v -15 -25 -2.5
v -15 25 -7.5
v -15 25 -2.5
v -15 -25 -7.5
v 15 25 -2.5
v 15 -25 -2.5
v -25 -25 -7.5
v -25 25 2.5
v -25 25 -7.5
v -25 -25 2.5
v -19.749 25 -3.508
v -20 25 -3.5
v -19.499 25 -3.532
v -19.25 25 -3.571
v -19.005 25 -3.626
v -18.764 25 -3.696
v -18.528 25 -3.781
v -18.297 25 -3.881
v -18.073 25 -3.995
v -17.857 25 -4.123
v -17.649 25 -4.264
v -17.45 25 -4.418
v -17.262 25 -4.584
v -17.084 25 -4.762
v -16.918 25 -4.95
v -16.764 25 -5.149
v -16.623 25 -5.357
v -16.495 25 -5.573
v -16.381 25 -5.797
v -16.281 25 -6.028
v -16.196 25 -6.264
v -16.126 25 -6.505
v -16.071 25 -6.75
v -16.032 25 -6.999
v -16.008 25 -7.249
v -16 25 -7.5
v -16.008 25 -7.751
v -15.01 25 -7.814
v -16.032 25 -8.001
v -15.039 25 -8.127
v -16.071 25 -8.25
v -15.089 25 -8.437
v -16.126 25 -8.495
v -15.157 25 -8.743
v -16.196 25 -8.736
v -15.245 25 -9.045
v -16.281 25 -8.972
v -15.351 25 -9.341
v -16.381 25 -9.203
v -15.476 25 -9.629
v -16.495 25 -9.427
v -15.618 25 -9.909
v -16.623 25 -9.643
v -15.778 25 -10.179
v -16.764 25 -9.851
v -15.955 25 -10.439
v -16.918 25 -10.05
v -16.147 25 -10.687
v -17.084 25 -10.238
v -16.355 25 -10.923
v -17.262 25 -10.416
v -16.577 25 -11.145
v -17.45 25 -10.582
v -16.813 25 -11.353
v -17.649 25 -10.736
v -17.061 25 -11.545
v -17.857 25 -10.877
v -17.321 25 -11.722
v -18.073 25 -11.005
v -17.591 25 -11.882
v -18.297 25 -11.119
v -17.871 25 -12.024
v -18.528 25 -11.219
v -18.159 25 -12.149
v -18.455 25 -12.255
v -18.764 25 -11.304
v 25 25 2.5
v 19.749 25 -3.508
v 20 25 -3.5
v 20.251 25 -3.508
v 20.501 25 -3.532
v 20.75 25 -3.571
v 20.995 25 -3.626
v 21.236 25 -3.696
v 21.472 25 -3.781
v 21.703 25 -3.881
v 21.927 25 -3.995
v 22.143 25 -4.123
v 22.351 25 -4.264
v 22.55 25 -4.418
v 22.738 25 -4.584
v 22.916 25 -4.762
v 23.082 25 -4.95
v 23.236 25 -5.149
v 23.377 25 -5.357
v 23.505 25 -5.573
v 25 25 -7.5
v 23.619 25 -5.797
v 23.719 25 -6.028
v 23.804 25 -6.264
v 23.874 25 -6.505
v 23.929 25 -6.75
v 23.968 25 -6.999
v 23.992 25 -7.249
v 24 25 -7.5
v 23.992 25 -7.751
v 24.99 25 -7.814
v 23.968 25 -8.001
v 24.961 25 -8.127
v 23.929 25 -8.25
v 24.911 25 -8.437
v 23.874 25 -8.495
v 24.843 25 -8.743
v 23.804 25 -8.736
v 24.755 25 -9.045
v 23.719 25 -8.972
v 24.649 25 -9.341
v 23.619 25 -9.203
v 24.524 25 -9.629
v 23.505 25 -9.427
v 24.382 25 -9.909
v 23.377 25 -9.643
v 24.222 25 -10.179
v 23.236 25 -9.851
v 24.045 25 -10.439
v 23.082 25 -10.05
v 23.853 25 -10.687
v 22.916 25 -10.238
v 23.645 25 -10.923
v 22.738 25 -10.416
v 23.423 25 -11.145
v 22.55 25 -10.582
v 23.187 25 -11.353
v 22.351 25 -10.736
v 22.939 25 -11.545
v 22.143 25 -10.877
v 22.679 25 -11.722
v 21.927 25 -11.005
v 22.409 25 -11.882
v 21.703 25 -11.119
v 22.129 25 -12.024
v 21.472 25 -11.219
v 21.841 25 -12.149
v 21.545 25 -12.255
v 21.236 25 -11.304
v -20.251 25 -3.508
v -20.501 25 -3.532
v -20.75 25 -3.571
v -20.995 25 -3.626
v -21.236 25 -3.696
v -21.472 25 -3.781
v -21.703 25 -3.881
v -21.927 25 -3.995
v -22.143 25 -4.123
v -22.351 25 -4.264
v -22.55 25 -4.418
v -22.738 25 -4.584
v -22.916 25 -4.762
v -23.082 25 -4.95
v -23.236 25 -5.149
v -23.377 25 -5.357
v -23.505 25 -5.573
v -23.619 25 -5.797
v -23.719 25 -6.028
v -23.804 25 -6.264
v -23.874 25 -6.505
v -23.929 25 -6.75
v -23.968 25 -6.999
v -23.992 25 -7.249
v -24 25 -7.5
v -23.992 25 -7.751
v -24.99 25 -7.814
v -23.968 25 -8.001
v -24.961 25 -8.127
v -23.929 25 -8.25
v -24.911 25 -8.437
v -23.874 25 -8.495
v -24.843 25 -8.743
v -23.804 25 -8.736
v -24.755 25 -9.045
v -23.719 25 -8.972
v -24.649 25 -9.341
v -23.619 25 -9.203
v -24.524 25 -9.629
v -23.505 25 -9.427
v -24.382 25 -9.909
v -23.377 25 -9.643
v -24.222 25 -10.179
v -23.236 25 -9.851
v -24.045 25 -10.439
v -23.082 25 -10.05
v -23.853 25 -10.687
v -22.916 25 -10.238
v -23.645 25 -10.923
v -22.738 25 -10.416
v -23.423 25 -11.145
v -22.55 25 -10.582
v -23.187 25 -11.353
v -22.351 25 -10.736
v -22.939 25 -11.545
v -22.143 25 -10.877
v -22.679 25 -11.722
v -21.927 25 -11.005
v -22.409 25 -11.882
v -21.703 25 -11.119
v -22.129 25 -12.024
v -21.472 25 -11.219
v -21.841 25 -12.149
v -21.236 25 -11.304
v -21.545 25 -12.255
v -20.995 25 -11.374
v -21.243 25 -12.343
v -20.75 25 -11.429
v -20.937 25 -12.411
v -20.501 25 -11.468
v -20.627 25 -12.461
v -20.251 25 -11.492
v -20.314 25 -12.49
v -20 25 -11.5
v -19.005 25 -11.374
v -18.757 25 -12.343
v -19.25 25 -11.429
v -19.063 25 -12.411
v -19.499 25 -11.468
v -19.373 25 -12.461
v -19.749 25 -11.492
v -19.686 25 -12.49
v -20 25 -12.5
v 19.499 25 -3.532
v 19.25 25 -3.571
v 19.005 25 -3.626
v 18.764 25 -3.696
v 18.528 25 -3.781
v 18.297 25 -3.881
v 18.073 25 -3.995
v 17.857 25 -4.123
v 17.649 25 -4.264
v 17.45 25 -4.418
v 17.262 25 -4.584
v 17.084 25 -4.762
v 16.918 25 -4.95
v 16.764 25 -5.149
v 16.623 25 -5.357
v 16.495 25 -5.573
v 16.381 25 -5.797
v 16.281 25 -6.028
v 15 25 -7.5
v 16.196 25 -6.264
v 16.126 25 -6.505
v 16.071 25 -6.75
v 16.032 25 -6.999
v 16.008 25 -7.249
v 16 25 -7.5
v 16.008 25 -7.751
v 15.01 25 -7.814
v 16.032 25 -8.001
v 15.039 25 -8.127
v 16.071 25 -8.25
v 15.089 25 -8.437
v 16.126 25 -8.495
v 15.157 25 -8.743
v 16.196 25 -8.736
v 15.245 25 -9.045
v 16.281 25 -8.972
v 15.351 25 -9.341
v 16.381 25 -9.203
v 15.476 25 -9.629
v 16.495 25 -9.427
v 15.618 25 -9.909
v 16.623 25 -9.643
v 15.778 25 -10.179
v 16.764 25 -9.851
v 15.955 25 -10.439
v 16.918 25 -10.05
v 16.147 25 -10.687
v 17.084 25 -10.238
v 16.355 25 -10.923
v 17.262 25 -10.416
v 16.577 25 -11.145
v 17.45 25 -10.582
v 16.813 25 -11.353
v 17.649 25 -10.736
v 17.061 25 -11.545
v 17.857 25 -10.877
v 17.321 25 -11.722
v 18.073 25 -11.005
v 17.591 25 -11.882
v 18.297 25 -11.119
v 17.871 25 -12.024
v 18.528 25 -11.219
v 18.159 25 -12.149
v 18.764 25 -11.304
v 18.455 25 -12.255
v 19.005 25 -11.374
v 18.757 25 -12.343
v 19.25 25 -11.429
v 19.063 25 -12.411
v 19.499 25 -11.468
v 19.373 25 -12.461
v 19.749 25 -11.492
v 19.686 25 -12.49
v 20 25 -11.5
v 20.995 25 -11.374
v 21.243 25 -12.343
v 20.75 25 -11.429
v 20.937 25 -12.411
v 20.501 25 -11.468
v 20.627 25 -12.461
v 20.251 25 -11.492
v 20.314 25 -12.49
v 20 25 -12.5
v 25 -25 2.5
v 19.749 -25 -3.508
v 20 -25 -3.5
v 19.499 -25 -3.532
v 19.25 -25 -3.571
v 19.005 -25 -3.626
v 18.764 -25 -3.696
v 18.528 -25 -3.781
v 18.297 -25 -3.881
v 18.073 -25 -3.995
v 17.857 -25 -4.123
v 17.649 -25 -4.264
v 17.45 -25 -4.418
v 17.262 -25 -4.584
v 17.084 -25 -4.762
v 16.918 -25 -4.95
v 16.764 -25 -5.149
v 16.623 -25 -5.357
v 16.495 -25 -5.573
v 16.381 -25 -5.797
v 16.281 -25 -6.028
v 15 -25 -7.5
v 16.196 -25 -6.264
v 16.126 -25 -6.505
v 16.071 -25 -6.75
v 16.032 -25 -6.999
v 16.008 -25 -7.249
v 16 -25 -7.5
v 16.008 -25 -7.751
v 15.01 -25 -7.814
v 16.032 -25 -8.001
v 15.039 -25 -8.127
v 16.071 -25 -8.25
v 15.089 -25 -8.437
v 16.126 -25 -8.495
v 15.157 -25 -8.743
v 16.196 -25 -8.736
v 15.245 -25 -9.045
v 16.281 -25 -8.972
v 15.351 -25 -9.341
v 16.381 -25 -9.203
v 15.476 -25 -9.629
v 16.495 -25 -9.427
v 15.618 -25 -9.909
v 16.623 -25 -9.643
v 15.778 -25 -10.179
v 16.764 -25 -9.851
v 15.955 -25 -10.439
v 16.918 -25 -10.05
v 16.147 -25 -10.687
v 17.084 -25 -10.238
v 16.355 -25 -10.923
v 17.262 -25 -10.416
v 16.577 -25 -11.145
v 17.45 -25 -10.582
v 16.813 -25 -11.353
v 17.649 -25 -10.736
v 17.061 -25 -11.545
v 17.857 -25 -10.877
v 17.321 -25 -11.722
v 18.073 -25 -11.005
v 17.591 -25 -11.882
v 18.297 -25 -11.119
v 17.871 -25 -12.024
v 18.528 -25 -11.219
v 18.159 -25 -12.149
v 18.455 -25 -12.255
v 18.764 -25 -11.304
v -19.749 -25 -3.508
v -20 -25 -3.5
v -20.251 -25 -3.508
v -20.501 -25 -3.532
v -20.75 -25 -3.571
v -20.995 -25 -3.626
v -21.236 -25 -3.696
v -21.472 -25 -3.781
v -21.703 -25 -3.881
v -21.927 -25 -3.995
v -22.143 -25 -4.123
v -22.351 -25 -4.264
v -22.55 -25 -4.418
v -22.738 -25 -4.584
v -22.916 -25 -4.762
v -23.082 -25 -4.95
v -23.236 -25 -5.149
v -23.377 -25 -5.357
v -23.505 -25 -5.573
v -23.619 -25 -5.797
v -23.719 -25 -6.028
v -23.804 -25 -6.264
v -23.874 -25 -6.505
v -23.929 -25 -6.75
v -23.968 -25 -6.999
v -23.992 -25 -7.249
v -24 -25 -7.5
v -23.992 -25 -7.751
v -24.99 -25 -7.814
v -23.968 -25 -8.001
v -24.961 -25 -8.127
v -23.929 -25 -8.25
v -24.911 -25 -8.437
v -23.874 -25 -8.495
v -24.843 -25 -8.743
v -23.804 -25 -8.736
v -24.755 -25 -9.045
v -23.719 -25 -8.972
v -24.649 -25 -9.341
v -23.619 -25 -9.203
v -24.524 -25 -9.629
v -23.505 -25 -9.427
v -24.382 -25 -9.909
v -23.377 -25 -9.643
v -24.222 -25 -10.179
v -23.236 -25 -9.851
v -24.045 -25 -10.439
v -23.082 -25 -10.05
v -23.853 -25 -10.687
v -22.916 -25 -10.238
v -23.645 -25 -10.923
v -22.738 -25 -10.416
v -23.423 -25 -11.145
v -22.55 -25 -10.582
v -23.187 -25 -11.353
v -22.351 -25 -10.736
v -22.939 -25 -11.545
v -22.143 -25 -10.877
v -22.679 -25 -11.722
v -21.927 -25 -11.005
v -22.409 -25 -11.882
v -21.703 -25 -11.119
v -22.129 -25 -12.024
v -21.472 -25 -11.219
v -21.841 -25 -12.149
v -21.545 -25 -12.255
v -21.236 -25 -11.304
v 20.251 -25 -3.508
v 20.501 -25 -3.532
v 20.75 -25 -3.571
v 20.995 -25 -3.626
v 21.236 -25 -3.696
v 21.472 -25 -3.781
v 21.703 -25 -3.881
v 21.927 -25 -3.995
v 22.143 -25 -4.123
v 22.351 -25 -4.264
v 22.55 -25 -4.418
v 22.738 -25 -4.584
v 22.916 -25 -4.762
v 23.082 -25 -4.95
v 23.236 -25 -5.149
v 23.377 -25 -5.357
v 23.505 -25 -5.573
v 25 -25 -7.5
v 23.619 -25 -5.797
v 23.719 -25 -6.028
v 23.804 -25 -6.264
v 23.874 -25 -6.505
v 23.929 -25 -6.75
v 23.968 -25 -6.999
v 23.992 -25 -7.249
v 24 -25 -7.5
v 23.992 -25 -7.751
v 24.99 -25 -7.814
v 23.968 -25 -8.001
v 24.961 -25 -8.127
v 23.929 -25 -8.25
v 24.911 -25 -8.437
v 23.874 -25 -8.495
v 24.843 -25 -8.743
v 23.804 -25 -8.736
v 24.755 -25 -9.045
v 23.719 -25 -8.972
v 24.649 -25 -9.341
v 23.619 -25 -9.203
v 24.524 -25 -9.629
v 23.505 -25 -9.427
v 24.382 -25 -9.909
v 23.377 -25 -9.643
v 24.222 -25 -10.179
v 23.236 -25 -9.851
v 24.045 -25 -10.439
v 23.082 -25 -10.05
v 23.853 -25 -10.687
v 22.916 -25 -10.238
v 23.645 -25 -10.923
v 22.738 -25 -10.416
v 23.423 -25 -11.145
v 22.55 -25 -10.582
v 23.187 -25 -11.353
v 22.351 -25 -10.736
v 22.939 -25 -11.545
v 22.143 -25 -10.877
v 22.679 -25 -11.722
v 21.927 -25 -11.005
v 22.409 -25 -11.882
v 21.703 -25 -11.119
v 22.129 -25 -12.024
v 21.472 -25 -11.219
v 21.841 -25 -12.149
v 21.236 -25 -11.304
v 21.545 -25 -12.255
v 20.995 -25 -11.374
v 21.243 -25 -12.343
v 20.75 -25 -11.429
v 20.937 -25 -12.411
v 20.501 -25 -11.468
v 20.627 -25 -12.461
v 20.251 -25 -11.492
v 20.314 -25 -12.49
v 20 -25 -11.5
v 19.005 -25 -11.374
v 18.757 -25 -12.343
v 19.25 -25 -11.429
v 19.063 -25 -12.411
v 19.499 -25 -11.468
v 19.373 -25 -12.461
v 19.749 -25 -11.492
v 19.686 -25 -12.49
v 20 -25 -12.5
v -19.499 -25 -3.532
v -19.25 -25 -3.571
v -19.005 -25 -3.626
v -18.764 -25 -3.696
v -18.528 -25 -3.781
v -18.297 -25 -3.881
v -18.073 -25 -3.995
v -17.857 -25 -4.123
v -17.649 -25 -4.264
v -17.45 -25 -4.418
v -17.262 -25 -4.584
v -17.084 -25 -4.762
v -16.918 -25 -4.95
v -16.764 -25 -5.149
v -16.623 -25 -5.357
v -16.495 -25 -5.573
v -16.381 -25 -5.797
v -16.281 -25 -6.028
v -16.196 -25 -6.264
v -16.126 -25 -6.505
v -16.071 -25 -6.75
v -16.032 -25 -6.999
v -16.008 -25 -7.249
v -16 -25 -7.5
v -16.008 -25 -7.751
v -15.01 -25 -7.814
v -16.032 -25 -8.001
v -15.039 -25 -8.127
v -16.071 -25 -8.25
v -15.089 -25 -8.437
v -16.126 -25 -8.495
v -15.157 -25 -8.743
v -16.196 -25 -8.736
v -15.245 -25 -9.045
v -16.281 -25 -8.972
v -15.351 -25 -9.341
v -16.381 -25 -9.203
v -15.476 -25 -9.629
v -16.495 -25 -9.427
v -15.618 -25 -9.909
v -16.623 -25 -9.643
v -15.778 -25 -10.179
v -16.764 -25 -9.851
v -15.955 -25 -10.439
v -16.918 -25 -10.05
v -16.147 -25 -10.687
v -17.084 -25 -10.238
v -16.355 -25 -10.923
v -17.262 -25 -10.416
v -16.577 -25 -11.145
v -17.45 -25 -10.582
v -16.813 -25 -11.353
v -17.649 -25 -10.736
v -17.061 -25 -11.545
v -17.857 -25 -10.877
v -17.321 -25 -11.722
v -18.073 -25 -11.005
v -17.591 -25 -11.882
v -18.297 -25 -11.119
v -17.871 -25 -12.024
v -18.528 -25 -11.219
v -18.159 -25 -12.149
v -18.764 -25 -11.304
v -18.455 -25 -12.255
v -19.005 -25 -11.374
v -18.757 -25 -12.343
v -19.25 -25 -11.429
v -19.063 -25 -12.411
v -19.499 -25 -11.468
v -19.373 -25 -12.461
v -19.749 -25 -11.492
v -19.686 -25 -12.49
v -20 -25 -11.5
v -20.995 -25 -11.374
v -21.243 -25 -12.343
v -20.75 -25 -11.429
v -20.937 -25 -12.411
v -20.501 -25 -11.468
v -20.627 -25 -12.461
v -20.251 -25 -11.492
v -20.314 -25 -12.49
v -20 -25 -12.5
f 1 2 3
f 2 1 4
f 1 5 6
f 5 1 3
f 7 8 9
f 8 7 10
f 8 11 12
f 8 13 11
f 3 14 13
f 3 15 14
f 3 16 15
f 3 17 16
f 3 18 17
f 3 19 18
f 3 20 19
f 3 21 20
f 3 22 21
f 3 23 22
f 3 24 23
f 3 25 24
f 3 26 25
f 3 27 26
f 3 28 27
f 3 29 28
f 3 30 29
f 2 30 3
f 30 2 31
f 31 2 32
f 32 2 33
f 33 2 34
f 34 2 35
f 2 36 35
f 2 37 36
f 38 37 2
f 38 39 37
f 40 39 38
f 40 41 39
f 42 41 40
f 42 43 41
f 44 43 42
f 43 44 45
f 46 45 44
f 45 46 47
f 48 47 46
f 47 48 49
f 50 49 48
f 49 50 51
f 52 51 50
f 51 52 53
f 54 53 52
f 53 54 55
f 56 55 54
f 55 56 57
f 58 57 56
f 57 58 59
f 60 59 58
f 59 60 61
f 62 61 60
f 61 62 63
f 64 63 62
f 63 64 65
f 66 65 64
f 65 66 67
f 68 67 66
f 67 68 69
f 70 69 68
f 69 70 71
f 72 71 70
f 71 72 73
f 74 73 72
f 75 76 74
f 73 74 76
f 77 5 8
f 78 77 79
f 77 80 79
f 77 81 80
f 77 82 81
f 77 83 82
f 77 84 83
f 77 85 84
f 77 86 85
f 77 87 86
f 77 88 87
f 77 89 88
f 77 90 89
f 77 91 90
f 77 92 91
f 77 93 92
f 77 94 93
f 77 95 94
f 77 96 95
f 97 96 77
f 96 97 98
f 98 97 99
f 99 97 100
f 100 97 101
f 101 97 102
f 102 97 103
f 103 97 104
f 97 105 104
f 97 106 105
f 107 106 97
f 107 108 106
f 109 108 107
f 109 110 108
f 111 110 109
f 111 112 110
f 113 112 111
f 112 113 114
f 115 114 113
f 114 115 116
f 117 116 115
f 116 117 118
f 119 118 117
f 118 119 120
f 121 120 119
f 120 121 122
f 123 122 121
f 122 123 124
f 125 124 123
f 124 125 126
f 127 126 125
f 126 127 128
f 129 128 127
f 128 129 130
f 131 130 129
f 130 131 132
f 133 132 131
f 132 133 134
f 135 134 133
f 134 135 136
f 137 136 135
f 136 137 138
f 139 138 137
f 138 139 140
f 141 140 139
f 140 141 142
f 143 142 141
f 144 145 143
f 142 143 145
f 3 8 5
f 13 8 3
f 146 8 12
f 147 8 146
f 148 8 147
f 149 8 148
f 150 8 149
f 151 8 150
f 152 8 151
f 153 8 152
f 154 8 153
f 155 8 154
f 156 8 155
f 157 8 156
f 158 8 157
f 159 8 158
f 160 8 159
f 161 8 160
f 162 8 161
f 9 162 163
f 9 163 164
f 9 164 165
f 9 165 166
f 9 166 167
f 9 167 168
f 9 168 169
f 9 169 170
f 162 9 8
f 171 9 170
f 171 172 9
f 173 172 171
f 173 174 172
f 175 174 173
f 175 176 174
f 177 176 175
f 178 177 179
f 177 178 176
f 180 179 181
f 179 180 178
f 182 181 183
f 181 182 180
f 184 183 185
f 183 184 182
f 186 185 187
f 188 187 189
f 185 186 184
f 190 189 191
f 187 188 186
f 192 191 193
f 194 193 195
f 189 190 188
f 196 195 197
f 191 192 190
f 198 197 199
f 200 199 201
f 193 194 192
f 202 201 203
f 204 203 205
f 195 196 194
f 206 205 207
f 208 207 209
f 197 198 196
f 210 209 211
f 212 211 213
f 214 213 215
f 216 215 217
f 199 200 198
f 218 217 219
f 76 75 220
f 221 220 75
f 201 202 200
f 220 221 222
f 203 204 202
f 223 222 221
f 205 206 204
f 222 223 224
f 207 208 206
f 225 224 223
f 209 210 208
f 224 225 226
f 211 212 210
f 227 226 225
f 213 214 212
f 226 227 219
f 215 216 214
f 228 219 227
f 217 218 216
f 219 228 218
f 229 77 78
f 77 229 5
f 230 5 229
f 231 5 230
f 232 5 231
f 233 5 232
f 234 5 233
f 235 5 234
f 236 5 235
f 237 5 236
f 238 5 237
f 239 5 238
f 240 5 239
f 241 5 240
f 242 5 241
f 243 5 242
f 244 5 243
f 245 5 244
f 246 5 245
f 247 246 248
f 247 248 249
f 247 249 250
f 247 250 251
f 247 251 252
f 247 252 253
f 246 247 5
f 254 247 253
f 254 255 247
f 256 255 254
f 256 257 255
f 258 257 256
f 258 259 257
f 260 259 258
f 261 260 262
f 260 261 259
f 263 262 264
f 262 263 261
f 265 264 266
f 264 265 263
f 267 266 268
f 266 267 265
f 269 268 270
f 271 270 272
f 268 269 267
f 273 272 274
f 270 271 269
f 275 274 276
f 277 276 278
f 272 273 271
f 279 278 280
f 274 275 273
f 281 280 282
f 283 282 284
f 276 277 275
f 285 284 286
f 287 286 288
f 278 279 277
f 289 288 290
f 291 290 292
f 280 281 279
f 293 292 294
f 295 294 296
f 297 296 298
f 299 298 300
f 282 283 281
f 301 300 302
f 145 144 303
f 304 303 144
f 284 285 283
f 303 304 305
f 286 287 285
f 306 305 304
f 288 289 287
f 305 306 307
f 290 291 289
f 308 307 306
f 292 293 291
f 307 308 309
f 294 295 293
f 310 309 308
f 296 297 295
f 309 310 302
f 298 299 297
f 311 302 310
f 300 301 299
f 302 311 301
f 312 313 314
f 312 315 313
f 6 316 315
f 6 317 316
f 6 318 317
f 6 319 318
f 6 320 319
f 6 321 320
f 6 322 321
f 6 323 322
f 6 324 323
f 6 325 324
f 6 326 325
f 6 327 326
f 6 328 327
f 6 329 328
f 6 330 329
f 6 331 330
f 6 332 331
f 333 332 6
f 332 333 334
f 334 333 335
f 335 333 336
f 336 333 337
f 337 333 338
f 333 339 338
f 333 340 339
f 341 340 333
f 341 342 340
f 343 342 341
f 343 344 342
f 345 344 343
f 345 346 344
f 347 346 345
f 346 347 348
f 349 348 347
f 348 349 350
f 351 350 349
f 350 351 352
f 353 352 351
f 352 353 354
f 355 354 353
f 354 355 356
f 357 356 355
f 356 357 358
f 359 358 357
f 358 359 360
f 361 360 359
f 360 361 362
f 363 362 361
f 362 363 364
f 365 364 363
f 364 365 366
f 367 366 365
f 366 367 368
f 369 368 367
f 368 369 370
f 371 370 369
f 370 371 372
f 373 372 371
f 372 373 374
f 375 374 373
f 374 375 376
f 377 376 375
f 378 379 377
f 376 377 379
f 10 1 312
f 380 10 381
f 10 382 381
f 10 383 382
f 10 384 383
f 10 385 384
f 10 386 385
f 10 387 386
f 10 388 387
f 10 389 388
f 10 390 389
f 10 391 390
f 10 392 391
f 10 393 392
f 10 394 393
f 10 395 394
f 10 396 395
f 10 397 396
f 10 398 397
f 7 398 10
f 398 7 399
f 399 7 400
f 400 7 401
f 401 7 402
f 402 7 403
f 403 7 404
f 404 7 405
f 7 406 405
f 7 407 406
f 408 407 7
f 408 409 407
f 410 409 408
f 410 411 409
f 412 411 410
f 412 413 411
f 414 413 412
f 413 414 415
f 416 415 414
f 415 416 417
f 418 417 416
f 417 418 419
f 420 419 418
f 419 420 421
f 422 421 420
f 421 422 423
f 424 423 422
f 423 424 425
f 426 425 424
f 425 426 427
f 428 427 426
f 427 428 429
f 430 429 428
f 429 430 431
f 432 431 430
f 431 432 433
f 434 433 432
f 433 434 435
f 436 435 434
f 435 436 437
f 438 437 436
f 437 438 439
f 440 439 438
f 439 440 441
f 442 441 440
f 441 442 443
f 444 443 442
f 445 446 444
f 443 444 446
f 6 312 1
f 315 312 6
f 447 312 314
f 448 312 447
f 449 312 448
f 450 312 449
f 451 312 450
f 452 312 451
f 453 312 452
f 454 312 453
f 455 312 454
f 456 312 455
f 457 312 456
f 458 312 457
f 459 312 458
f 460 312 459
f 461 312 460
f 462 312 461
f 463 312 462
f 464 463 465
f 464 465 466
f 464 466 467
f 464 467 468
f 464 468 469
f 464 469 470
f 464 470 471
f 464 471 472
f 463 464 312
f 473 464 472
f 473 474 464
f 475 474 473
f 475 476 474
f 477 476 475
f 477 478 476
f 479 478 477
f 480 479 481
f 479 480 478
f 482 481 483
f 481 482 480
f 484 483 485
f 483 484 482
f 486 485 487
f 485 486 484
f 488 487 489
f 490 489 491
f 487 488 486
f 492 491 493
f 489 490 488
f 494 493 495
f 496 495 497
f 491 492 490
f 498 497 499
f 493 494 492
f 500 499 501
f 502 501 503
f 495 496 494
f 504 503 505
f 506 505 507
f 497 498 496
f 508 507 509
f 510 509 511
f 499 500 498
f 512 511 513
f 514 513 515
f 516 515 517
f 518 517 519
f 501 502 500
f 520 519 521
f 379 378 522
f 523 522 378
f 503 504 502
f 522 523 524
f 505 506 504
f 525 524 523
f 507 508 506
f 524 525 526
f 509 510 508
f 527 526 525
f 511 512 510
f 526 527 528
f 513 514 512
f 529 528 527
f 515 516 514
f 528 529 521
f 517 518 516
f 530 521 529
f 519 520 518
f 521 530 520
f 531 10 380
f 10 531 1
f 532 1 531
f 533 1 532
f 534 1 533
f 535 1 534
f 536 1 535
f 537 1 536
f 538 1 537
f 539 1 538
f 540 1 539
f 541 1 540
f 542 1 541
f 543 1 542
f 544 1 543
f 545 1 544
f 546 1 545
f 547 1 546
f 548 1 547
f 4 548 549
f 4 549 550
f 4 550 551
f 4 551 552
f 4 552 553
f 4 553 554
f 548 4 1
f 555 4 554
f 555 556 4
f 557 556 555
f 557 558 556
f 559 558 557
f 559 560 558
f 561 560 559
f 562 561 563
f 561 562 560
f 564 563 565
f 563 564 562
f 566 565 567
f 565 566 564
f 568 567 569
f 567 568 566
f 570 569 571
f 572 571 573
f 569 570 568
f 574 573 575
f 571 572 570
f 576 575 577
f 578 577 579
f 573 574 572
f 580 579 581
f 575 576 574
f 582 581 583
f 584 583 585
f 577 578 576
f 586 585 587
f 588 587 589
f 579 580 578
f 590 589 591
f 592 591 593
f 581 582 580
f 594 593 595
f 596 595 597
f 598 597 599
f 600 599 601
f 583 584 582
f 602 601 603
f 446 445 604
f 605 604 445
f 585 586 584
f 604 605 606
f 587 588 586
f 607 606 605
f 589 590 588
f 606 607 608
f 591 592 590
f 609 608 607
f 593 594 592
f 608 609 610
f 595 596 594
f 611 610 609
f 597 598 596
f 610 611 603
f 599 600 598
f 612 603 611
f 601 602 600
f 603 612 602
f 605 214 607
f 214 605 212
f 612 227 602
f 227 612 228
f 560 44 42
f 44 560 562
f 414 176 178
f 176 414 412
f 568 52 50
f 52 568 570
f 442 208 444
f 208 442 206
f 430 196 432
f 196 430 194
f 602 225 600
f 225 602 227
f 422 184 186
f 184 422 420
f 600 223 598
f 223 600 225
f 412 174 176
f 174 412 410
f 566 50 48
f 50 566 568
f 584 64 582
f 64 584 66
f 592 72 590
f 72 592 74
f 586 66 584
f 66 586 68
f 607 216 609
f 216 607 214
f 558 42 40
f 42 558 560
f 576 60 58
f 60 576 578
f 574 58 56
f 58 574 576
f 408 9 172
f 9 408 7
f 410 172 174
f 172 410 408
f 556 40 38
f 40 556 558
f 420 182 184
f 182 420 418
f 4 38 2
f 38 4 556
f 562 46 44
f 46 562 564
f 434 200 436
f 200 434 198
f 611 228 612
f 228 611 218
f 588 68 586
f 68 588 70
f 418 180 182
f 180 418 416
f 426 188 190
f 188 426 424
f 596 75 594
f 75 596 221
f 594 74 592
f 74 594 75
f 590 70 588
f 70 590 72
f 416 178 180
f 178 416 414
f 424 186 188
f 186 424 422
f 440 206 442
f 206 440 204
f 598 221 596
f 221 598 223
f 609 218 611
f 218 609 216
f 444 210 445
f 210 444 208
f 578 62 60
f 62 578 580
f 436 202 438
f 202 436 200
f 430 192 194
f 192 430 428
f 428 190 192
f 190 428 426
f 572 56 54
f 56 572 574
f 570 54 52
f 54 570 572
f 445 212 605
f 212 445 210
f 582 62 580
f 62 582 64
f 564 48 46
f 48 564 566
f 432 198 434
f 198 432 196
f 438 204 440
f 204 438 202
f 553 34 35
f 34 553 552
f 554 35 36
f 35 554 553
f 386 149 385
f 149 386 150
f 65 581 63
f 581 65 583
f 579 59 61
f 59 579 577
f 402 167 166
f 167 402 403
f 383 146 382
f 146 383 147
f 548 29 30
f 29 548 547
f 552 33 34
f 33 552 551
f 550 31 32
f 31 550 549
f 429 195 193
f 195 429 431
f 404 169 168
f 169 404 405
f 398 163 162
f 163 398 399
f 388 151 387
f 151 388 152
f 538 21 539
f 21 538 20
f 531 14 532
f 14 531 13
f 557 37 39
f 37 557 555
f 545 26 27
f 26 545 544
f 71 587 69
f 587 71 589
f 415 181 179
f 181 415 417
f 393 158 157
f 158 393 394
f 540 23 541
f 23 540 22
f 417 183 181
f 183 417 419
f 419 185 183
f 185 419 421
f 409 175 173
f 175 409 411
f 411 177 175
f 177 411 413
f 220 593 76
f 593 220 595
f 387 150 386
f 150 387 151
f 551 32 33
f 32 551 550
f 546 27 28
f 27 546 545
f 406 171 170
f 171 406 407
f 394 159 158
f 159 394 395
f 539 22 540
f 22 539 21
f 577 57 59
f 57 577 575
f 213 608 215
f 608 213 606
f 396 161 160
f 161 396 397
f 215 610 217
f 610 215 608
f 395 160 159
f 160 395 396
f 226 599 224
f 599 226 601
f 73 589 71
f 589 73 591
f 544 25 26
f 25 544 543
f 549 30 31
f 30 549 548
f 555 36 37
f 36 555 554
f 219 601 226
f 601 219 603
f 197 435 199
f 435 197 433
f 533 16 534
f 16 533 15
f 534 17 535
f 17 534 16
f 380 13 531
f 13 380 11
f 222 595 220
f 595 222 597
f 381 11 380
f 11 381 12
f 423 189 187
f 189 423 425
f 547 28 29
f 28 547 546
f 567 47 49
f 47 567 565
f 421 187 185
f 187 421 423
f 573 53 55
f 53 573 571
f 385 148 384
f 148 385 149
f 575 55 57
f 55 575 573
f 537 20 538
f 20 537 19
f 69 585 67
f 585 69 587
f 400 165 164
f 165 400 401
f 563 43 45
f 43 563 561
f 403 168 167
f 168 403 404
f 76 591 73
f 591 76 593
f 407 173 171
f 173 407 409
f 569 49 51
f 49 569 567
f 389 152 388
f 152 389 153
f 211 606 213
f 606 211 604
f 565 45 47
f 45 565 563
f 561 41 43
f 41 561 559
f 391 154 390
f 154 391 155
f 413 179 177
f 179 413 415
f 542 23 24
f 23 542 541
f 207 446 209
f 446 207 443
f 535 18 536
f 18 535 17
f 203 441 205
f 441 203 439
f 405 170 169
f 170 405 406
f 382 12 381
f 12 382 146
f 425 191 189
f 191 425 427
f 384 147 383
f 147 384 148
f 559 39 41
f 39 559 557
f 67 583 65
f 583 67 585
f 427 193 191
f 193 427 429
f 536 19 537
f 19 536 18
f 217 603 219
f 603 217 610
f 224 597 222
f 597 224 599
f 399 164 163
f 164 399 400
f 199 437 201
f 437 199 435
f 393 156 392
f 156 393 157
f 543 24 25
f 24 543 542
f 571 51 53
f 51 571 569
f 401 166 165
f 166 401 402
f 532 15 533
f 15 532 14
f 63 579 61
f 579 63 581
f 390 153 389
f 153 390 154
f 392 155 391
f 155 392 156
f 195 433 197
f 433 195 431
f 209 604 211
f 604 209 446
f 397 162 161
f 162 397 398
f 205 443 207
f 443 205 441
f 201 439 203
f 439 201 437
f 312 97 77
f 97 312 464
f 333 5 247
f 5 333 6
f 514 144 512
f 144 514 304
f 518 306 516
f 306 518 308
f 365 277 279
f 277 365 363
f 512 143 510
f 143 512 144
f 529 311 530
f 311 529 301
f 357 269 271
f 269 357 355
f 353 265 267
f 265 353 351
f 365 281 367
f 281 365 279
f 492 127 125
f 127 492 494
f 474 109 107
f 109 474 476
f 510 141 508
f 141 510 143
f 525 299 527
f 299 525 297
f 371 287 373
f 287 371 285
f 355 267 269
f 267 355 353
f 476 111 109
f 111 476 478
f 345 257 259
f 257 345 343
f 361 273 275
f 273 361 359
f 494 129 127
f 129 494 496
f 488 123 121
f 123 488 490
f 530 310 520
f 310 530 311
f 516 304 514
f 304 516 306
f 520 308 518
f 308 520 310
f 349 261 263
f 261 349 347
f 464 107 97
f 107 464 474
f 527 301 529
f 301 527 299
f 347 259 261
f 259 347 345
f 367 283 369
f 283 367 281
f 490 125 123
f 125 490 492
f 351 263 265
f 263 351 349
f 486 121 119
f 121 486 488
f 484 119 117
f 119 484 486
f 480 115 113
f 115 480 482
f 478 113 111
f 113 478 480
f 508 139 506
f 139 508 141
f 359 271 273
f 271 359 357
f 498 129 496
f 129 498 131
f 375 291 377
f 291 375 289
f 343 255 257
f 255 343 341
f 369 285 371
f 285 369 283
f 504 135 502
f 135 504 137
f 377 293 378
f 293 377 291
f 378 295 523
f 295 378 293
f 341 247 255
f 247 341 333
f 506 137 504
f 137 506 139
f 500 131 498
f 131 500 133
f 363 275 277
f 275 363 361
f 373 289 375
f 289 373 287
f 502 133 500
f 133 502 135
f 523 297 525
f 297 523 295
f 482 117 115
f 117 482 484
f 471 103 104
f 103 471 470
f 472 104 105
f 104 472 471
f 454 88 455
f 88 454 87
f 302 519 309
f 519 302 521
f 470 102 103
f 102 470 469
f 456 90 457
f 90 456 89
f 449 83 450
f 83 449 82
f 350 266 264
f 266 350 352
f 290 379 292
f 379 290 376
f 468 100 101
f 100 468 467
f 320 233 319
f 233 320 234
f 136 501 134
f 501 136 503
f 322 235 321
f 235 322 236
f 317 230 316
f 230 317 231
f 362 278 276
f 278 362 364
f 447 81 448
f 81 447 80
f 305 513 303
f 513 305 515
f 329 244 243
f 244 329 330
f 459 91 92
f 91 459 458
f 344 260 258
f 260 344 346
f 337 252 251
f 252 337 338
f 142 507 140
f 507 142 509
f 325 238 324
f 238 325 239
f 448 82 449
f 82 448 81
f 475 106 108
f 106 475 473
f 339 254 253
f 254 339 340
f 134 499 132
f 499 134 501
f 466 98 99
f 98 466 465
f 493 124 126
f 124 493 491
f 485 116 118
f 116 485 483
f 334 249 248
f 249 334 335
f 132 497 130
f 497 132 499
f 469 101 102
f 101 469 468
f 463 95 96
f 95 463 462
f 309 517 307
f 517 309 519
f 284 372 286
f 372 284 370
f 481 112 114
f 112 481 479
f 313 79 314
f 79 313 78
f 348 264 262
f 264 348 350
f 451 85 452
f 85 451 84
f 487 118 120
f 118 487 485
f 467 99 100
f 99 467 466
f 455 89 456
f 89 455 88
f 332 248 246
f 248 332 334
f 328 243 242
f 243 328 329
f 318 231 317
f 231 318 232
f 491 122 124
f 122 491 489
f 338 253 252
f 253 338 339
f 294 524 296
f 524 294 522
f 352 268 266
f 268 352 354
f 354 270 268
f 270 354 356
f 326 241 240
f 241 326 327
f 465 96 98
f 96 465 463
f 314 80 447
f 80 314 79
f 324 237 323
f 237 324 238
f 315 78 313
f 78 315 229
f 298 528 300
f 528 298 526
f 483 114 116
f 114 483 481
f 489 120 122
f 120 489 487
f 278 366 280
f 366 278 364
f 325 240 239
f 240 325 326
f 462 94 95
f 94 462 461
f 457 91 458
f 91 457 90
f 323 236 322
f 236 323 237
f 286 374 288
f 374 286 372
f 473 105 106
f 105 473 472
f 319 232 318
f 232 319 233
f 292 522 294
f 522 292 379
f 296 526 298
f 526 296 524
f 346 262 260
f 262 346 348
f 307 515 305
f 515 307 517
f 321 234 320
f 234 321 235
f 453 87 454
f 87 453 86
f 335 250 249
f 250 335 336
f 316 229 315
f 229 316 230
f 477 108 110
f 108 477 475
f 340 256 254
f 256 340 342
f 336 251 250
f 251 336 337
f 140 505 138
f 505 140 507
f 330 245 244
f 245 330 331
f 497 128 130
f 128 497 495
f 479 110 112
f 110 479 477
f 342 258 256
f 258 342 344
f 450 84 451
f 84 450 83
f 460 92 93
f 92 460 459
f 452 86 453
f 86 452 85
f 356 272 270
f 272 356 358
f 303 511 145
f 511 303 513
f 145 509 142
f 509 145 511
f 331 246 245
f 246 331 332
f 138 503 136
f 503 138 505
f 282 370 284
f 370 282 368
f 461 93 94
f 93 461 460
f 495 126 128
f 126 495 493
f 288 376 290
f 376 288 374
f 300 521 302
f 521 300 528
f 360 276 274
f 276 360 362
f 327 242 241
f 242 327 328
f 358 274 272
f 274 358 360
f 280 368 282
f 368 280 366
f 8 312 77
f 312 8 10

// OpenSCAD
module ring(r1,r2,h){
    difference(){
    cylinder(r=r1,h=h, $fn=100,center=true);
        cylinder(r=r2,h=h*2, $fn=100,center=true);
    }
}





cube([50,50,5], center=true);
for(i=[0:1]){
    let(dx=[-1,1][i]*(25-5), x=0, y=0, z=-5/2-10/2)
    difference(){
        union(){
            translate([x+dx,y,z+5/2])cube([10,50,5],center=true);
            translate([x+dx,y,z]) rotate([90,0,0])cylinder(h=50,r=5,center=true,$fn=100);
        }
        translate([x+dx,y,z]) rotate([90,0,0])cylinder(h=100,r=4,center=true,$fn=100);
    }


}

ring(12, 8, 2);
  
